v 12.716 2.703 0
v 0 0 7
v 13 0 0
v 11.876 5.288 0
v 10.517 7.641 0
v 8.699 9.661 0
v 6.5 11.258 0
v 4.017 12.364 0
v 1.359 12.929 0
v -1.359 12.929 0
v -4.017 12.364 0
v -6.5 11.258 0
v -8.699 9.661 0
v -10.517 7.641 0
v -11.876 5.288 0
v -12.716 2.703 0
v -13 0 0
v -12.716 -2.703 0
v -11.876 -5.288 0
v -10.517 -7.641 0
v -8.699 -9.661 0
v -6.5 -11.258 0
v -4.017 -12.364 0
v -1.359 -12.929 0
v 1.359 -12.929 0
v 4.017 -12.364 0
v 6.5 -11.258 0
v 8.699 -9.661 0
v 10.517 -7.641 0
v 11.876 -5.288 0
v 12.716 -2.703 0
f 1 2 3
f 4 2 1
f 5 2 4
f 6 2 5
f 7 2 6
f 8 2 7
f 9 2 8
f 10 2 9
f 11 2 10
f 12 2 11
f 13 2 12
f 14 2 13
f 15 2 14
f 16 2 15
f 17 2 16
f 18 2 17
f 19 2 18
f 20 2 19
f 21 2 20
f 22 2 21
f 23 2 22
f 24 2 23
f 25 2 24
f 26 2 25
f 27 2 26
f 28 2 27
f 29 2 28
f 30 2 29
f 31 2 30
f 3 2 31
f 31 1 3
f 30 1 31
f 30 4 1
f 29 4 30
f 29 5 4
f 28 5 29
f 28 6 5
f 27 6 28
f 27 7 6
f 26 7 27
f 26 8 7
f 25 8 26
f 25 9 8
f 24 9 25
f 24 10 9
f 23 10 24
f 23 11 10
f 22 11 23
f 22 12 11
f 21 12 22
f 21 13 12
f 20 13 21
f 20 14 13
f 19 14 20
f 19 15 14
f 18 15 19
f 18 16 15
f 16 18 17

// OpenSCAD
// Generated by SolidPython 1.0.1 on 2020-07-29 00:46:43


cylinder(h = 7, r1 = 13, r2 = 0);
/***********************************************
*********      SolidPython code:      **********
************************************************
 
# import packages: SolidPython
from solid import *
from solid.utils import *
from itertools import chain, combinations, permutations


class Resize:

    def __init__(self, scad_file):
        self.scad_file = scad_file
        #self.scad_file = import_scad(scad_file)
        # cone/cylinder param:
        self.r1 = 0
        self.r2 = 0
        self.h = 0
        # rectangular prism param:
        self.w = 0
        self.l = 0
        # ellipse param:
        self.r = 0

    # import OpenScad code (file name corresponds to shape)


    # classify shape + parameters
    def assign(self, param1, param2, param3):
        if self.scad_file == 'cone.scad':
            self.r1 = param1
            self.r2 = param2
            self.h = param3
        elif self.scad_file == 'cylinder.scad':
            self.r1 = param1
            self.r2 = param2
            self.h = param3
        elif self.scad_file == 'rectangularPrism.scad':
            self.h = param1
            self.l = param2
            self.w = param3
        else:
            self.r = param1
            self.h = param2

    # resize parameters
    def iterate(self):
        x = range(3, 20, 2)
        i = 1
        if self.scad_file == 'cone.scad':
            tempList = list(permutations(x, 2))
            for temp in tempList:
                param1 = temp[0]
                param2 = temp[1]
                filepath = 'produced_scad_files/' + 'cone' + str(param1) + '_' + str(param2) + '_' + '.scad'
                scad_render_to_file(cylinder(h=param1, r1=param2, r2=0), filepath)

        elif self.scad_file == 'cylinder.scad':
            tempList = list(permutations(x, 3))
            for temp in tempList:
                param1 = temp[0]
                param2 = temp[1]
                filepath = 'produced_scad_files/' + 'cylinder' + str(param1) + '_' + str(param2) + '_' + '.scad'
                scad_render_to_file(cylinder(h=param1, r1=param2, r2=param2), filepath)

        elif self.scad_file == 'rectangularPrism.scad':
            tempList = list(permutations(x, 3))
            for temp in tempList:
                param1 = temp[0]
                param2 = temp[1]
                param3 = temp[2]
                filepath = 'produced_scad_files/' + 'rectangularPrism' + str(param1) + '_' + str(param2) + '_' + str(
                    param3) + '.scad'
                scad_render_to_file(cube(size=(param1, param2, param3)), filepath)

        elif self.scad_file == 'ellipse.scad':
            tempList = list(permutations(x, 4))
            for temp in tempList:
                param1 = temp[0]
                param2 = temp[1]
                param3 = temp[2]
                param4 = temp[3]
                filepath = 'produced_scad_files/' + 'ellipse' + str(param1) + '_' + str(param2) + '_' + str(param3) + '_' + str(param4) + '.scad'
                scad_render_to_file(scale([param1, param2, param3])(sphere(r=param4)), filepath)

    def render_to_scadfile(self):
        scad_render_to_file(scad, 'example.scad') 
 
************************************************/
